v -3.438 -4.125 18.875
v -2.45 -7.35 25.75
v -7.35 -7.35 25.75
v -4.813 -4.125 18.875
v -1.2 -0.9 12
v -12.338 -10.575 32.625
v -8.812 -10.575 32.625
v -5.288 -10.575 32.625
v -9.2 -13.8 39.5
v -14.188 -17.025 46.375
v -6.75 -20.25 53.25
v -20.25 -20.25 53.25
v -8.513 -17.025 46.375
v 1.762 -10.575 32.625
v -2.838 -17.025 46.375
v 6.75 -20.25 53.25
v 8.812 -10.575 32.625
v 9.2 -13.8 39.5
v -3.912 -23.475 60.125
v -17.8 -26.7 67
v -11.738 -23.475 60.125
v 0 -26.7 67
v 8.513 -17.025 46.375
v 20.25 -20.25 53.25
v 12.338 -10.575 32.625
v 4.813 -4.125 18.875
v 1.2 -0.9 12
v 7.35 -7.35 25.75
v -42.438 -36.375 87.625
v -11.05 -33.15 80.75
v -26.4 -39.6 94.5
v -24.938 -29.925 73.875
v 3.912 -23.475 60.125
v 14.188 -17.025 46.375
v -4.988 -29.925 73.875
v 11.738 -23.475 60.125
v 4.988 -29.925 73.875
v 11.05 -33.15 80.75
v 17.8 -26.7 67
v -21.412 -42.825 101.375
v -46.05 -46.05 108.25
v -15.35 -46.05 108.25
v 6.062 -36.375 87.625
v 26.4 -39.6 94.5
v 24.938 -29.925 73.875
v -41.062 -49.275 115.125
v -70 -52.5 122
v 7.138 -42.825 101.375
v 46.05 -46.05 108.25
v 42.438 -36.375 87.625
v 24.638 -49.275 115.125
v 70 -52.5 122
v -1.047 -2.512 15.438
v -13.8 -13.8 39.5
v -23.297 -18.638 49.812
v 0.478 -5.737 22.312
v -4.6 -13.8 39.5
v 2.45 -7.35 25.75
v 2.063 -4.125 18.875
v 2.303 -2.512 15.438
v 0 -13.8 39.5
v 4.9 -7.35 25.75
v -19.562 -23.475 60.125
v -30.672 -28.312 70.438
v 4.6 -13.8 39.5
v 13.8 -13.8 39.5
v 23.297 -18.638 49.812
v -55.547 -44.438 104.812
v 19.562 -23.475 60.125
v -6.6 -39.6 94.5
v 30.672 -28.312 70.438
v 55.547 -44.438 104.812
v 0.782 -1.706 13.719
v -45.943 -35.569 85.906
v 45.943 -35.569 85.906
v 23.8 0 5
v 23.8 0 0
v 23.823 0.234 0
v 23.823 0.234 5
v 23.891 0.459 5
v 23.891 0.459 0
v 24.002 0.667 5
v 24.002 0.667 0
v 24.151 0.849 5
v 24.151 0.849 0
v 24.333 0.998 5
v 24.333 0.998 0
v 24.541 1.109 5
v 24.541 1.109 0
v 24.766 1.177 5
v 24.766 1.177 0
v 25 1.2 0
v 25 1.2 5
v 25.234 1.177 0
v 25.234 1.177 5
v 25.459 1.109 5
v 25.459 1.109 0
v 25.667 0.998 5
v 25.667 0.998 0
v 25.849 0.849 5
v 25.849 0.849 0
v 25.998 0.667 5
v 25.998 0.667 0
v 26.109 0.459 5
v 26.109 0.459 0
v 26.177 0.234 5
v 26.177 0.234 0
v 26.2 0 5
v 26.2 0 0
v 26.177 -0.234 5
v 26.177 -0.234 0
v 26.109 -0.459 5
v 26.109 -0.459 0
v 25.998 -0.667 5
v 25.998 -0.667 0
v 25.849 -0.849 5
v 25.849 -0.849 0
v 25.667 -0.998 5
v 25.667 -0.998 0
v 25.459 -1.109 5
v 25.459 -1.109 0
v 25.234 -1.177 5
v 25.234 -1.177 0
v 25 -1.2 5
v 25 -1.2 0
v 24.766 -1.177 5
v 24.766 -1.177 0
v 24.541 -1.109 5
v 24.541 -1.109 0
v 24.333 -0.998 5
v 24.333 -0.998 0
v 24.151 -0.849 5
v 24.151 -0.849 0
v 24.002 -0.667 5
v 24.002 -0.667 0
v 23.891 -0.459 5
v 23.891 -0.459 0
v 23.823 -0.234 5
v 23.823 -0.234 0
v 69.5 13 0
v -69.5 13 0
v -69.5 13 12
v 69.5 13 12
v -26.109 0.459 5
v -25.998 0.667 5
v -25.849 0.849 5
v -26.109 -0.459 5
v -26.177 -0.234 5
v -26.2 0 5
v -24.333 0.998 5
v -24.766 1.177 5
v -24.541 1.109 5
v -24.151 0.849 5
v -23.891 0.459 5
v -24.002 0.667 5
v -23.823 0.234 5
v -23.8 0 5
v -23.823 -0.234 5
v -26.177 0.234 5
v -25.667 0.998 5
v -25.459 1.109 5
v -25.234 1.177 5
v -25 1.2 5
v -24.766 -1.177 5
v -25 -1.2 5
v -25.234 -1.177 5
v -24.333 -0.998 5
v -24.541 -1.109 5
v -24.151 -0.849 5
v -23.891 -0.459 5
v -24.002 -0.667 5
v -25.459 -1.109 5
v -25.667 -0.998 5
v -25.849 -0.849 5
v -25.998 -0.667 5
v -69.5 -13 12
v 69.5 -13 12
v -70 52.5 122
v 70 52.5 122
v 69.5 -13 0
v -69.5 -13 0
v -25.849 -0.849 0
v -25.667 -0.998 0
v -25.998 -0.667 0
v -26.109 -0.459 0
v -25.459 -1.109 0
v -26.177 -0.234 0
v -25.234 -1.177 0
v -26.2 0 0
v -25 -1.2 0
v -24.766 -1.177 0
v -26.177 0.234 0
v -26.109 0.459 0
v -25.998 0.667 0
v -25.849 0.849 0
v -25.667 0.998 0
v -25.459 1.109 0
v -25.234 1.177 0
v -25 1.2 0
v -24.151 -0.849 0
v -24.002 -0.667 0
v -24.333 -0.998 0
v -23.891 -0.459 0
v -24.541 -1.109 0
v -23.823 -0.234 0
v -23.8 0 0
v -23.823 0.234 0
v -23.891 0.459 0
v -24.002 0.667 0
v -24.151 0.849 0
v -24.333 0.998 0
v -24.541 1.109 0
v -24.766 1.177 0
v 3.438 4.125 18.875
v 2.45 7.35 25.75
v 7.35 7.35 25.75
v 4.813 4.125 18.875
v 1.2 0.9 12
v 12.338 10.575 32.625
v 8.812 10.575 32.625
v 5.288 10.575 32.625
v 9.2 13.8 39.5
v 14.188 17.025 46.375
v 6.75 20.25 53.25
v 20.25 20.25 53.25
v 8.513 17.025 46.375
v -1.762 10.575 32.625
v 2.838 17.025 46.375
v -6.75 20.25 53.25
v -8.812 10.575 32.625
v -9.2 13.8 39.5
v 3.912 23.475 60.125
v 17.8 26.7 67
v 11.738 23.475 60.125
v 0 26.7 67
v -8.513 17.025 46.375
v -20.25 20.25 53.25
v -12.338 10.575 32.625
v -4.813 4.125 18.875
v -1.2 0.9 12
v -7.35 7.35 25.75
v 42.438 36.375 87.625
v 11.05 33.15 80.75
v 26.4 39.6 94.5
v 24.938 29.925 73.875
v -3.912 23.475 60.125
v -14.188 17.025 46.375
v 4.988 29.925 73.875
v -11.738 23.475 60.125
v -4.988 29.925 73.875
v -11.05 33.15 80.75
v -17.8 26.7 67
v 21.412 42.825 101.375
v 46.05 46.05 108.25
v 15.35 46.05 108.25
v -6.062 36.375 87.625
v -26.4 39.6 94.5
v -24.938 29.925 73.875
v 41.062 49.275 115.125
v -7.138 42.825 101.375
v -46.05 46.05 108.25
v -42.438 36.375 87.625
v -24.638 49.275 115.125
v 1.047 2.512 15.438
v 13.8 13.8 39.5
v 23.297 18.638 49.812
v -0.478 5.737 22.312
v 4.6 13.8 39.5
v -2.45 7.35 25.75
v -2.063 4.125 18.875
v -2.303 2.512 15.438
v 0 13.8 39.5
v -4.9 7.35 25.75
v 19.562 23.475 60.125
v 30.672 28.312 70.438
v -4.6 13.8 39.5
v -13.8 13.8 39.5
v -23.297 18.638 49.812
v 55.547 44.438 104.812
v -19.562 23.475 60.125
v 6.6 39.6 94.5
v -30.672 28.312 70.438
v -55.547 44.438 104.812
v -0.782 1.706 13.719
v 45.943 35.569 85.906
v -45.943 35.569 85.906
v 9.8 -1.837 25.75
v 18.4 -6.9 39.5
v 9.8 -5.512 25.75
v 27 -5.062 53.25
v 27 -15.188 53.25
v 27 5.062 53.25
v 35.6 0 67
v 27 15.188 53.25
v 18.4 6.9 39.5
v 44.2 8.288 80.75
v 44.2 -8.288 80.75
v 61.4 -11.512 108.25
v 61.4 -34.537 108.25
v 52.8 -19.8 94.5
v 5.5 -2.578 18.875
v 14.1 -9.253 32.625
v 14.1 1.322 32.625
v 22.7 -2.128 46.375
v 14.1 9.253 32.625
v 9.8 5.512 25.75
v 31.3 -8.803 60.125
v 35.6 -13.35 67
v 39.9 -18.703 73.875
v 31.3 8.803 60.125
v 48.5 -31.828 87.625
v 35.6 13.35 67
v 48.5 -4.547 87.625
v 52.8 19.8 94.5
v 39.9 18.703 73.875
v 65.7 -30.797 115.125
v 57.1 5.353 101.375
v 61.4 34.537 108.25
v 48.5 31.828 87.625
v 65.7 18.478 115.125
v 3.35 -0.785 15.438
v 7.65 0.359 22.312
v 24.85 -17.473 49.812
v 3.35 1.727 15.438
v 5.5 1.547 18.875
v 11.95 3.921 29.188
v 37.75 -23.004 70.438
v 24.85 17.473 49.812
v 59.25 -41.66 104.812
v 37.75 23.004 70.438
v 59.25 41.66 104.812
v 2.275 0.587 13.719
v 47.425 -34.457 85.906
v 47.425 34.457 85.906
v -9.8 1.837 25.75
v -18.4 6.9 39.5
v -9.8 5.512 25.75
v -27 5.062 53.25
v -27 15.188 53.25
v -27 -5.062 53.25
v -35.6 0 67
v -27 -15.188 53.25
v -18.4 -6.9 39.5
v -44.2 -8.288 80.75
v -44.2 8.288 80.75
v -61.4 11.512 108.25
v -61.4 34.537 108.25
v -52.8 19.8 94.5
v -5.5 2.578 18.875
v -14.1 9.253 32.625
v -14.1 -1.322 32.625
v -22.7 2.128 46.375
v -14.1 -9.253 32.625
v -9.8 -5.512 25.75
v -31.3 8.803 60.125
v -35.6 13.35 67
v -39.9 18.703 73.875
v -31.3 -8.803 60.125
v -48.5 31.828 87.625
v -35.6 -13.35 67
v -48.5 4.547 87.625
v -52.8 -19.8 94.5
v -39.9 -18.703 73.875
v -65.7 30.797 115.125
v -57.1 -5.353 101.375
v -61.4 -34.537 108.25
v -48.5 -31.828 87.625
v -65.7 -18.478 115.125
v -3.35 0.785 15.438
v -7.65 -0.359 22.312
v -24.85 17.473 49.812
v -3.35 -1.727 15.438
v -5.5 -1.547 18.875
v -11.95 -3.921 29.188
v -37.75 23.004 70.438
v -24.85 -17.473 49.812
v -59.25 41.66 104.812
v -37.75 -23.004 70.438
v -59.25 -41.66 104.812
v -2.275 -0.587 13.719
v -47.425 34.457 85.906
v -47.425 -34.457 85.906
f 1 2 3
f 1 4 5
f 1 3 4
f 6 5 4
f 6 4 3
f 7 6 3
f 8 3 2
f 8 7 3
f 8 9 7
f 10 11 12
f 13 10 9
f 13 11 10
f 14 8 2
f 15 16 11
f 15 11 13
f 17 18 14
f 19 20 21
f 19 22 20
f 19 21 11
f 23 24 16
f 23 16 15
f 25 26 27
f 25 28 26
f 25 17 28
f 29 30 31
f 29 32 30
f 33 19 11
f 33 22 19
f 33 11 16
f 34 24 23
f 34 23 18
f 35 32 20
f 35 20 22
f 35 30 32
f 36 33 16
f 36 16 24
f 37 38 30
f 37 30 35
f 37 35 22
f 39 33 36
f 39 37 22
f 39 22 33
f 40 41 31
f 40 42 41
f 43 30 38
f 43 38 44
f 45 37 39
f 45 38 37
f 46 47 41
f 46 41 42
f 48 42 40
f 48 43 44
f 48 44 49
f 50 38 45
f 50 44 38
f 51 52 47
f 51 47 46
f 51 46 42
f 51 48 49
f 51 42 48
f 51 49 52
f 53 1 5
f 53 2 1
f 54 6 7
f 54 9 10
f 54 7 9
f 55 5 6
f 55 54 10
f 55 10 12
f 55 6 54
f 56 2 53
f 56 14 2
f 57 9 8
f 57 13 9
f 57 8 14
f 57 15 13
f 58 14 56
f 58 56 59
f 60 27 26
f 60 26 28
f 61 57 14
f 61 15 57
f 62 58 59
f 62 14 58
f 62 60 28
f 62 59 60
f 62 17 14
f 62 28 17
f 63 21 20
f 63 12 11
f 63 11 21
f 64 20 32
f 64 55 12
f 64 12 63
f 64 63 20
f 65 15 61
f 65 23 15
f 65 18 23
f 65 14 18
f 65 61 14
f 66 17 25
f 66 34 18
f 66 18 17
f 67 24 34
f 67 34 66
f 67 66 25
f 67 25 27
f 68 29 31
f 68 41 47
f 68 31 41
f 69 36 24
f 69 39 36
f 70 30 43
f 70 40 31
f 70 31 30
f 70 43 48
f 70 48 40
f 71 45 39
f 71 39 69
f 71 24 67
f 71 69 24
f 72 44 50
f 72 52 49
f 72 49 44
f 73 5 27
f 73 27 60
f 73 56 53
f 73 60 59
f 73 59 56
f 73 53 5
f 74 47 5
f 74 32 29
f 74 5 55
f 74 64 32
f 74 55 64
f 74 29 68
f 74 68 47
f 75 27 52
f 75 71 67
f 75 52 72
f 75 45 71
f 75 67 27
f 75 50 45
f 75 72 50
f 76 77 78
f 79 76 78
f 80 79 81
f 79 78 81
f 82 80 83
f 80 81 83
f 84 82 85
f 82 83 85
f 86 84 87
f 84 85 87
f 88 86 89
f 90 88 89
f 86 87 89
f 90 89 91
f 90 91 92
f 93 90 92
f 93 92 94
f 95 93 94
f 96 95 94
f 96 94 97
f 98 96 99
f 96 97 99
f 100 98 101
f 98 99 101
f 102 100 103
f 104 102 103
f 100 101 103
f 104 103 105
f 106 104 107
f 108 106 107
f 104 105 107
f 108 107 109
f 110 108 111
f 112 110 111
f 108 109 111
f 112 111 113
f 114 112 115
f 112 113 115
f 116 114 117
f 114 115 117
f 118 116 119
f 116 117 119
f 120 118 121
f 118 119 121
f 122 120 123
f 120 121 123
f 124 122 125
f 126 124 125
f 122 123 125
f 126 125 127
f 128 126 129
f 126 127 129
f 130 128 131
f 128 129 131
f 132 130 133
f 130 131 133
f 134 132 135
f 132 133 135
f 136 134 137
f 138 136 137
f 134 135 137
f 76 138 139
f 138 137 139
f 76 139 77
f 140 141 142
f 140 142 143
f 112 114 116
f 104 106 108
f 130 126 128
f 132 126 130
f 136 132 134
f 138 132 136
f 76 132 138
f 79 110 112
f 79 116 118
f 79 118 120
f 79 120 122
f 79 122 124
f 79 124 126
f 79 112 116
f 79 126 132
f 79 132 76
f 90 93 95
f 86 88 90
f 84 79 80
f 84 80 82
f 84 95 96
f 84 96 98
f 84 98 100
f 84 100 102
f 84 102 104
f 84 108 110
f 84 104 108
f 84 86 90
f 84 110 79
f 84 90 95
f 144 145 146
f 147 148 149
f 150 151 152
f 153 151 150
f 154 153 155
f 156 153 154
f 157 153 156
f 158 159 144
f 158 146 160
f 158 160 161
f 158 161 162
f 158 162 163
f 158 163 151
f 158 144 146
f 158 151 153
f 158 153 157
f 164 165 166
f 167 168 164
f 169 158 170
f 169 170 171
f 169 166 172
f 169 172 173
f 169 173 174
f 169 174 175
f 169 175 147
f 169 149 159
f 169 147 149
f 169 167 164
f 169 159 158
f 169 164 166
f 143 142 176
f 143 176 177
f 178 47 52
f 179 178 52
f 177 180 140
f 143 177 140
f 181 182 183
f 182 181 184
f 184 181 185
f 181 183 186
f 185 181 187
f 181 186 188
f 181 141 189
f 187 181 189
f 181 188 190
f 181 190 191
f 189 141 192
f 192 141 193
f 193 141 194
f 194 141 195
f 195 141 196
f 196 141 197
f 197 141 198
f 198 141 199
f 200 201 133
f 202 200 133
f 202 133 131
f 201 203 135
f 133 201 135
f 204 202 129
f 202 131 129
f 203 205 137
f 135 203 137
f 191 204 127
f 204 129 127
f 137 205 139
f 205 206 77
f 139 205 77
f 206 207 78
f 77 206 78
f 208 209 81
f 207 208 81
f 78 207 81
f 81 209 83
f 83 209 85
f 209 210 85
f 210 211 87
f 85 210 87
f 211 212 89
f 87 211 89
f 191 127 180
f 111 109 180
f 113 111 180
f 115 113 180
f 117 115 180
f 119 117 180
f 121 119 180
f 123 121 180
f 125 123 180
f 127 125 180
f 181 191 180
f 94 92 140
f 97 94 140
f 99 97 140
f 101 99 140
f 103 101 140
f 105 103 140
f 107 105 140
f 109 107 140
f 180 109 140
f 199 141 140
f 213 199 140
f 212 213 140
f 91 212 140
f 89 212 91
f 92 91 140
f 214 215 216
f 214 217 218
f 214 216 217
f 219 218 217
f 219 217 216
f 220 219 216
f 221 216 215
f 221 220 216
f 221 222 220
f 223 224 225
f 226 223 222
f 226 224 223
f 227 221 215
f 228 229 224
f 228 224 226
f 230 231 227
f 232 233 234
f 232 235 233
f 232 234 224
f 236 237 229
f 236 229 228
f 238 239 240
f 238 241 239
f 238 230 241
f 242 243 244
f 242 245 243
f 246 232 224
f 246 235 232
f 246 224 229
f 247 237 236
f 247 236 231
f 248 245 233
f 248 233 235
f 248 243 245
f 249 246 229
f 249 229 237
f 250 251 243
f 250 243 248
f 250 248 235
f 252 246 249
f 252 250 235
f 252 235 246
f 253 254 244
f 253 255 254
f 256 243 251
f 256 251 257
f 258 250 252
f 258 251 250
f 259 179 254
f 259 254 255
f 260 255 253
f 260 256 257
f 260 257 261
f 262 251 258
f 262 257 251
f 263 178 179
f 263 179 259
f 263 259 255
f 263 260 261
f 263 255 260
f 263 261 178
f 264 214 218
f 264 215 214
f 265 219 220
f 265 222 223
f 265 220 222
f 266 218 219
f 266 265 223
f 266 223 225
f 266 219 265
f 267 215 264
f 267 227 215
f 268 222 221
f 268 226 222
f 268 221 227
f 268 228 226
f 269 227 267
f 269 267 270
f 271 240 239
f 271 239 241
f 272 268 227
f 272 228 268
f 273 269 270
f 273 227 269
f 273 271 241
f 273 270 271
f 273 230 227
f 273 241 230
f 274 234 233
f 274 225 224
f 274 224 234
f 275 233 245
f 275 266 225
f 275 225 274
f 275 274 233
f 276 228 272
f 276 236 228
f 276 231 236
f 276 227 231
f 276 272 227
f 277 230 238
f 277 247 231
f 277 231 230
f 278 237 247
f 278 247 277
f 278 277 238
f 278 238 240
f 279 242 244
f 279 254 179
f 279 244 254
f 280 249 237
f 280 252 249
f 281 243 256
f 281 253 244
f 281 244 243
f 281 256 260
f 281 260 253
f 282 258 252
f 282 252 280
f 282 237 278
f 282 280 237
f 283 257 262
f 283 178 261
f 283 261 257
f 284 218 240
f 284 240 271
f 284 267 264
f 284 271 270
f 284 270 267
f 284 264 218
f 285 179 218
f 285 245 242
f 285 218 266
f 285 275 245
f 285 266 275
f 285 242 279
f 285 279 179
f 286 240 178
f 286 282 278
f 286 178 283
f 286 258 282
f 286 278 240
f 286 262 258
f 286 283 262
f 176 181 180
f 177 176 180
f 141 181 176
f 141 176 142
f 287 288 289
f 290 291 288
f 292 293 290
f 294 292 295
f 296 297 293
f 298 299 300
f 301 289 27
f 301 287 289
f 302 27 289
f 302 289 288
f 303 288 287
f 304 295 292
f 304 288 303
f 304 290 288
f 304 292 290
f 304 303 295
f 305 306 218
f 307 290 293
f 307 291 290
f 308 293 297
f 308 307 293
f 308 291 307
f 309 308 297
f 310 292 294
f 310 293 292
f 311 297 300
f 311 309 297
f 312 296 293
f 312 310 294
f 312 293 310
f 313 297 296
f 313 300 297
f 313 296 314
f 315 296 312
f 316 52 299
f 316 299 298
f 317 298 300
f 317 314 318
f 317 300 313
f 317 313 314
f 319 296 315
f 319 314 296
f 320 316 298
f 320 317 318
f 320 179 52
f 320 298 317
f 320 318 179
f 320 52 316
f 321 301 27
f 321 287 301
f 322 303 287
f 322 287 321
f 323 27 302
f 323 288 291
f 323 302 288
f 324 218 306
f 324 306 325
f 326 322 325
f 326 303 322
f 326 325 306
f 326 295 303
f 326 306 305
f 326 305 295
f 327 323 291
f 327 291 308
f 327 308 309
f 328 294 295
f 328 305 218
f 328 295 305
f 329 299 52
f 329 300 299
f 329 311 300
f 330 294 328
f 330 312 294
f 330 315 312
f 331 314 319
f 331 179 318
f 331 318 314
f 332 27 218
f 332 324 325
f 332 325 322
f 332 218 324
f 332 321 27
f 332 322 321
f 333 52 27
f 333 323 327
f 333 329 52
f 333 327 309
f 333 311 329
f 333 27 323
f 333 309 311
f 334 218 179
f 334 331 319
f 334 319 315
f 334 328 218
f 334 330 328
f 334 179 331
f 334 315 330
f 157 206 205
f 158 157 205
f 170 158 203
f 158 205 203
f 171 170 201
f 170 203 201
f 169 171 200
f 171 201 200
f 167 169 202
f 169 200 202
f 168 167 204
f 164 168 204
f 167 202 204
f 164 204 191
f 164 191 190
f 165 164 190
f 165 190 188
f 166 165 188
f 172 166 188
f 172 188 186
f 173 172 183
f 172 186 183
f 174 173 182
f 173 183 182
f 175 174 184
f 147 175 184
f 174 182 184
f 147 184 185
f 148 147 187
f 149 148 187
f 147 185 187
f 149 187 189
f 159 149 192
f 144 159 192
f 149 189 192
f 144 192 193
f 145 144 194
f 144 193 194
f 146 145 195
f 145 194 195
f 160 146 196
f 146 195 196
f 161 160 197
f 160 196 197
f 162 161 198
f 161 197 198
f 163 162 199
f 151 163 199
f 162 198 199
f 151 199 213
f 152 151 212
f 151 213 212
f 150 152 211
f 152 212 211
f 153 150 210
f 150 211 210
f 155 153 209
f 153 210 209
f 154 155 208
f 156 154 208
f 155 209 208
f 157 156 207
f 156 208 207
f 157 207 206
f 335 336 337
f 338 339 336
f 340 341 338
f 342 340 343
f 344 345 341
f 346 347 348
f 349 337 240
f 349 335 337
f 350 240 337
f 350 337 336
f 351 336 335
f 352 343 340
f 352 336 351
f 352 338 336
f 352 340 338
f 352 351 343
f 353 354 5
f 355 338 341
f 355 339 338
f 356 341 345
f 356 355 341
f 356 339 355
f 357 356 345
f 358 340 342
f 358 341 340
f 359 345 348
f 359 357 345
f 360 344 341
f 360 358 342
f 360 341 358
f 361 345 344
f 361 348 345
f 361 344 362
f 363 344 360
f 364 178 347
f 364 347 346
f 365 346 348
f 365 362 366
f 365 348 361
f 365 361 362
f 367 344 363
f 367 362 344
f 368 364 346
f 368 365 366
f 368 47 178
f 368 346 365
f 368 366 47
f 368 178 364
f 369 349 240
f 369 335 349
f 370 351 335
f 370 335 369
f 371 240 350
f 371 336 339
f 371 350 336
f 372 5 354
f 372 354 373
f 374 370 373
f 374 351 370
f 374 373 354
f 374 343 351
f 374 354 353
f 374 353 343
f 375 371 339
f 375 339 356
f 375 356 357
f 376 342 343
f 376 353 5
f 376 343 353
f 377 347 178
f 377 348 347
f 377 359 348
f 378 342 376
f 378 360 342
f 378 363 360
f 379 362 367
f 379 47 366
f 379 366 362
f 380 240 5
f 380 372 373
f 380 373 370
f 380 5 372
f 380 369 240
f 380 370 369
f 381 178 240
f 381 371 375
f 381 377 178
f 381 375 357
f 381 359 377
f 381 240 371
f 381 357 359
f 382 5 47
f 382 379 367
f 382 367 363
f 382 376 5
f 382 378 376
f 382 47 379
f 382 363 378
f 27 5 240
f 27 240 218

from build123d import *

# Parameters (mm, degrees)
SKETCH_1_W          = 139
SKETCH_1_H          = 26
EXTRUDE_1_DEPTH     = 12
SKETCH_2_R          = 1.2
CUT_EXTRUDE_1_DEPTH = 5


with BuildPart() as part:
    # 草图1 → 凸台-拉伸1 (new body)
    with BuildSketch(Plane.XY):
        Rectangle(SKETCH_1_W, SKETCH_1_H)
    extrude(amount=EXTRUDE_1_DEPTH)

    # 草图2 → 切除-拉伸1 (cut)
    with BuildSketch(Plane(origin=(0, 0, 0), x_dir=(-1, 0, 0), z_dir=(0, 0, -1))):
        with Locations((-25, 0)):
            Circle(SKETCH_2_R)
        with Locations(Location((25, 0, 0), (0, 0, 180))):
            Circle(SKETCH_2_R)
    extrude(amount=-CUT_EXTRUDE_1_DEPTH, mode=Mode.SUBTRACT)


with BuildPart() as body_2:
    # 草图5 → 放样1 section 0
    with BuildSketch(Plane.XY.offset(12)):
        with BuildLine():
            Line((-1.2, -0.9), (1.2, -0.9))
            Line((1.2, -0.9), (1.2, 0.9))
            Line((1.2, 0.9), (-1.2, 0.9))
            Line((-1.2, 0.9), (-1.2, -0.9))
        make_face()
    # 草图4 → 放样1 section 1
    with BuildSketch(Plane.XY.offset(122)):
        with BuildLine():
            Line((-70, -52.5), (70, -52.5))
            Line((70, -52.5), (70, 52.5))
            Line((70, 52.5), (-70, 52.5))
            Line((-70, 52.5), (-70, -52.5))
        make_face()
    loft()


solid = Compound([part.part, body_2.part])
